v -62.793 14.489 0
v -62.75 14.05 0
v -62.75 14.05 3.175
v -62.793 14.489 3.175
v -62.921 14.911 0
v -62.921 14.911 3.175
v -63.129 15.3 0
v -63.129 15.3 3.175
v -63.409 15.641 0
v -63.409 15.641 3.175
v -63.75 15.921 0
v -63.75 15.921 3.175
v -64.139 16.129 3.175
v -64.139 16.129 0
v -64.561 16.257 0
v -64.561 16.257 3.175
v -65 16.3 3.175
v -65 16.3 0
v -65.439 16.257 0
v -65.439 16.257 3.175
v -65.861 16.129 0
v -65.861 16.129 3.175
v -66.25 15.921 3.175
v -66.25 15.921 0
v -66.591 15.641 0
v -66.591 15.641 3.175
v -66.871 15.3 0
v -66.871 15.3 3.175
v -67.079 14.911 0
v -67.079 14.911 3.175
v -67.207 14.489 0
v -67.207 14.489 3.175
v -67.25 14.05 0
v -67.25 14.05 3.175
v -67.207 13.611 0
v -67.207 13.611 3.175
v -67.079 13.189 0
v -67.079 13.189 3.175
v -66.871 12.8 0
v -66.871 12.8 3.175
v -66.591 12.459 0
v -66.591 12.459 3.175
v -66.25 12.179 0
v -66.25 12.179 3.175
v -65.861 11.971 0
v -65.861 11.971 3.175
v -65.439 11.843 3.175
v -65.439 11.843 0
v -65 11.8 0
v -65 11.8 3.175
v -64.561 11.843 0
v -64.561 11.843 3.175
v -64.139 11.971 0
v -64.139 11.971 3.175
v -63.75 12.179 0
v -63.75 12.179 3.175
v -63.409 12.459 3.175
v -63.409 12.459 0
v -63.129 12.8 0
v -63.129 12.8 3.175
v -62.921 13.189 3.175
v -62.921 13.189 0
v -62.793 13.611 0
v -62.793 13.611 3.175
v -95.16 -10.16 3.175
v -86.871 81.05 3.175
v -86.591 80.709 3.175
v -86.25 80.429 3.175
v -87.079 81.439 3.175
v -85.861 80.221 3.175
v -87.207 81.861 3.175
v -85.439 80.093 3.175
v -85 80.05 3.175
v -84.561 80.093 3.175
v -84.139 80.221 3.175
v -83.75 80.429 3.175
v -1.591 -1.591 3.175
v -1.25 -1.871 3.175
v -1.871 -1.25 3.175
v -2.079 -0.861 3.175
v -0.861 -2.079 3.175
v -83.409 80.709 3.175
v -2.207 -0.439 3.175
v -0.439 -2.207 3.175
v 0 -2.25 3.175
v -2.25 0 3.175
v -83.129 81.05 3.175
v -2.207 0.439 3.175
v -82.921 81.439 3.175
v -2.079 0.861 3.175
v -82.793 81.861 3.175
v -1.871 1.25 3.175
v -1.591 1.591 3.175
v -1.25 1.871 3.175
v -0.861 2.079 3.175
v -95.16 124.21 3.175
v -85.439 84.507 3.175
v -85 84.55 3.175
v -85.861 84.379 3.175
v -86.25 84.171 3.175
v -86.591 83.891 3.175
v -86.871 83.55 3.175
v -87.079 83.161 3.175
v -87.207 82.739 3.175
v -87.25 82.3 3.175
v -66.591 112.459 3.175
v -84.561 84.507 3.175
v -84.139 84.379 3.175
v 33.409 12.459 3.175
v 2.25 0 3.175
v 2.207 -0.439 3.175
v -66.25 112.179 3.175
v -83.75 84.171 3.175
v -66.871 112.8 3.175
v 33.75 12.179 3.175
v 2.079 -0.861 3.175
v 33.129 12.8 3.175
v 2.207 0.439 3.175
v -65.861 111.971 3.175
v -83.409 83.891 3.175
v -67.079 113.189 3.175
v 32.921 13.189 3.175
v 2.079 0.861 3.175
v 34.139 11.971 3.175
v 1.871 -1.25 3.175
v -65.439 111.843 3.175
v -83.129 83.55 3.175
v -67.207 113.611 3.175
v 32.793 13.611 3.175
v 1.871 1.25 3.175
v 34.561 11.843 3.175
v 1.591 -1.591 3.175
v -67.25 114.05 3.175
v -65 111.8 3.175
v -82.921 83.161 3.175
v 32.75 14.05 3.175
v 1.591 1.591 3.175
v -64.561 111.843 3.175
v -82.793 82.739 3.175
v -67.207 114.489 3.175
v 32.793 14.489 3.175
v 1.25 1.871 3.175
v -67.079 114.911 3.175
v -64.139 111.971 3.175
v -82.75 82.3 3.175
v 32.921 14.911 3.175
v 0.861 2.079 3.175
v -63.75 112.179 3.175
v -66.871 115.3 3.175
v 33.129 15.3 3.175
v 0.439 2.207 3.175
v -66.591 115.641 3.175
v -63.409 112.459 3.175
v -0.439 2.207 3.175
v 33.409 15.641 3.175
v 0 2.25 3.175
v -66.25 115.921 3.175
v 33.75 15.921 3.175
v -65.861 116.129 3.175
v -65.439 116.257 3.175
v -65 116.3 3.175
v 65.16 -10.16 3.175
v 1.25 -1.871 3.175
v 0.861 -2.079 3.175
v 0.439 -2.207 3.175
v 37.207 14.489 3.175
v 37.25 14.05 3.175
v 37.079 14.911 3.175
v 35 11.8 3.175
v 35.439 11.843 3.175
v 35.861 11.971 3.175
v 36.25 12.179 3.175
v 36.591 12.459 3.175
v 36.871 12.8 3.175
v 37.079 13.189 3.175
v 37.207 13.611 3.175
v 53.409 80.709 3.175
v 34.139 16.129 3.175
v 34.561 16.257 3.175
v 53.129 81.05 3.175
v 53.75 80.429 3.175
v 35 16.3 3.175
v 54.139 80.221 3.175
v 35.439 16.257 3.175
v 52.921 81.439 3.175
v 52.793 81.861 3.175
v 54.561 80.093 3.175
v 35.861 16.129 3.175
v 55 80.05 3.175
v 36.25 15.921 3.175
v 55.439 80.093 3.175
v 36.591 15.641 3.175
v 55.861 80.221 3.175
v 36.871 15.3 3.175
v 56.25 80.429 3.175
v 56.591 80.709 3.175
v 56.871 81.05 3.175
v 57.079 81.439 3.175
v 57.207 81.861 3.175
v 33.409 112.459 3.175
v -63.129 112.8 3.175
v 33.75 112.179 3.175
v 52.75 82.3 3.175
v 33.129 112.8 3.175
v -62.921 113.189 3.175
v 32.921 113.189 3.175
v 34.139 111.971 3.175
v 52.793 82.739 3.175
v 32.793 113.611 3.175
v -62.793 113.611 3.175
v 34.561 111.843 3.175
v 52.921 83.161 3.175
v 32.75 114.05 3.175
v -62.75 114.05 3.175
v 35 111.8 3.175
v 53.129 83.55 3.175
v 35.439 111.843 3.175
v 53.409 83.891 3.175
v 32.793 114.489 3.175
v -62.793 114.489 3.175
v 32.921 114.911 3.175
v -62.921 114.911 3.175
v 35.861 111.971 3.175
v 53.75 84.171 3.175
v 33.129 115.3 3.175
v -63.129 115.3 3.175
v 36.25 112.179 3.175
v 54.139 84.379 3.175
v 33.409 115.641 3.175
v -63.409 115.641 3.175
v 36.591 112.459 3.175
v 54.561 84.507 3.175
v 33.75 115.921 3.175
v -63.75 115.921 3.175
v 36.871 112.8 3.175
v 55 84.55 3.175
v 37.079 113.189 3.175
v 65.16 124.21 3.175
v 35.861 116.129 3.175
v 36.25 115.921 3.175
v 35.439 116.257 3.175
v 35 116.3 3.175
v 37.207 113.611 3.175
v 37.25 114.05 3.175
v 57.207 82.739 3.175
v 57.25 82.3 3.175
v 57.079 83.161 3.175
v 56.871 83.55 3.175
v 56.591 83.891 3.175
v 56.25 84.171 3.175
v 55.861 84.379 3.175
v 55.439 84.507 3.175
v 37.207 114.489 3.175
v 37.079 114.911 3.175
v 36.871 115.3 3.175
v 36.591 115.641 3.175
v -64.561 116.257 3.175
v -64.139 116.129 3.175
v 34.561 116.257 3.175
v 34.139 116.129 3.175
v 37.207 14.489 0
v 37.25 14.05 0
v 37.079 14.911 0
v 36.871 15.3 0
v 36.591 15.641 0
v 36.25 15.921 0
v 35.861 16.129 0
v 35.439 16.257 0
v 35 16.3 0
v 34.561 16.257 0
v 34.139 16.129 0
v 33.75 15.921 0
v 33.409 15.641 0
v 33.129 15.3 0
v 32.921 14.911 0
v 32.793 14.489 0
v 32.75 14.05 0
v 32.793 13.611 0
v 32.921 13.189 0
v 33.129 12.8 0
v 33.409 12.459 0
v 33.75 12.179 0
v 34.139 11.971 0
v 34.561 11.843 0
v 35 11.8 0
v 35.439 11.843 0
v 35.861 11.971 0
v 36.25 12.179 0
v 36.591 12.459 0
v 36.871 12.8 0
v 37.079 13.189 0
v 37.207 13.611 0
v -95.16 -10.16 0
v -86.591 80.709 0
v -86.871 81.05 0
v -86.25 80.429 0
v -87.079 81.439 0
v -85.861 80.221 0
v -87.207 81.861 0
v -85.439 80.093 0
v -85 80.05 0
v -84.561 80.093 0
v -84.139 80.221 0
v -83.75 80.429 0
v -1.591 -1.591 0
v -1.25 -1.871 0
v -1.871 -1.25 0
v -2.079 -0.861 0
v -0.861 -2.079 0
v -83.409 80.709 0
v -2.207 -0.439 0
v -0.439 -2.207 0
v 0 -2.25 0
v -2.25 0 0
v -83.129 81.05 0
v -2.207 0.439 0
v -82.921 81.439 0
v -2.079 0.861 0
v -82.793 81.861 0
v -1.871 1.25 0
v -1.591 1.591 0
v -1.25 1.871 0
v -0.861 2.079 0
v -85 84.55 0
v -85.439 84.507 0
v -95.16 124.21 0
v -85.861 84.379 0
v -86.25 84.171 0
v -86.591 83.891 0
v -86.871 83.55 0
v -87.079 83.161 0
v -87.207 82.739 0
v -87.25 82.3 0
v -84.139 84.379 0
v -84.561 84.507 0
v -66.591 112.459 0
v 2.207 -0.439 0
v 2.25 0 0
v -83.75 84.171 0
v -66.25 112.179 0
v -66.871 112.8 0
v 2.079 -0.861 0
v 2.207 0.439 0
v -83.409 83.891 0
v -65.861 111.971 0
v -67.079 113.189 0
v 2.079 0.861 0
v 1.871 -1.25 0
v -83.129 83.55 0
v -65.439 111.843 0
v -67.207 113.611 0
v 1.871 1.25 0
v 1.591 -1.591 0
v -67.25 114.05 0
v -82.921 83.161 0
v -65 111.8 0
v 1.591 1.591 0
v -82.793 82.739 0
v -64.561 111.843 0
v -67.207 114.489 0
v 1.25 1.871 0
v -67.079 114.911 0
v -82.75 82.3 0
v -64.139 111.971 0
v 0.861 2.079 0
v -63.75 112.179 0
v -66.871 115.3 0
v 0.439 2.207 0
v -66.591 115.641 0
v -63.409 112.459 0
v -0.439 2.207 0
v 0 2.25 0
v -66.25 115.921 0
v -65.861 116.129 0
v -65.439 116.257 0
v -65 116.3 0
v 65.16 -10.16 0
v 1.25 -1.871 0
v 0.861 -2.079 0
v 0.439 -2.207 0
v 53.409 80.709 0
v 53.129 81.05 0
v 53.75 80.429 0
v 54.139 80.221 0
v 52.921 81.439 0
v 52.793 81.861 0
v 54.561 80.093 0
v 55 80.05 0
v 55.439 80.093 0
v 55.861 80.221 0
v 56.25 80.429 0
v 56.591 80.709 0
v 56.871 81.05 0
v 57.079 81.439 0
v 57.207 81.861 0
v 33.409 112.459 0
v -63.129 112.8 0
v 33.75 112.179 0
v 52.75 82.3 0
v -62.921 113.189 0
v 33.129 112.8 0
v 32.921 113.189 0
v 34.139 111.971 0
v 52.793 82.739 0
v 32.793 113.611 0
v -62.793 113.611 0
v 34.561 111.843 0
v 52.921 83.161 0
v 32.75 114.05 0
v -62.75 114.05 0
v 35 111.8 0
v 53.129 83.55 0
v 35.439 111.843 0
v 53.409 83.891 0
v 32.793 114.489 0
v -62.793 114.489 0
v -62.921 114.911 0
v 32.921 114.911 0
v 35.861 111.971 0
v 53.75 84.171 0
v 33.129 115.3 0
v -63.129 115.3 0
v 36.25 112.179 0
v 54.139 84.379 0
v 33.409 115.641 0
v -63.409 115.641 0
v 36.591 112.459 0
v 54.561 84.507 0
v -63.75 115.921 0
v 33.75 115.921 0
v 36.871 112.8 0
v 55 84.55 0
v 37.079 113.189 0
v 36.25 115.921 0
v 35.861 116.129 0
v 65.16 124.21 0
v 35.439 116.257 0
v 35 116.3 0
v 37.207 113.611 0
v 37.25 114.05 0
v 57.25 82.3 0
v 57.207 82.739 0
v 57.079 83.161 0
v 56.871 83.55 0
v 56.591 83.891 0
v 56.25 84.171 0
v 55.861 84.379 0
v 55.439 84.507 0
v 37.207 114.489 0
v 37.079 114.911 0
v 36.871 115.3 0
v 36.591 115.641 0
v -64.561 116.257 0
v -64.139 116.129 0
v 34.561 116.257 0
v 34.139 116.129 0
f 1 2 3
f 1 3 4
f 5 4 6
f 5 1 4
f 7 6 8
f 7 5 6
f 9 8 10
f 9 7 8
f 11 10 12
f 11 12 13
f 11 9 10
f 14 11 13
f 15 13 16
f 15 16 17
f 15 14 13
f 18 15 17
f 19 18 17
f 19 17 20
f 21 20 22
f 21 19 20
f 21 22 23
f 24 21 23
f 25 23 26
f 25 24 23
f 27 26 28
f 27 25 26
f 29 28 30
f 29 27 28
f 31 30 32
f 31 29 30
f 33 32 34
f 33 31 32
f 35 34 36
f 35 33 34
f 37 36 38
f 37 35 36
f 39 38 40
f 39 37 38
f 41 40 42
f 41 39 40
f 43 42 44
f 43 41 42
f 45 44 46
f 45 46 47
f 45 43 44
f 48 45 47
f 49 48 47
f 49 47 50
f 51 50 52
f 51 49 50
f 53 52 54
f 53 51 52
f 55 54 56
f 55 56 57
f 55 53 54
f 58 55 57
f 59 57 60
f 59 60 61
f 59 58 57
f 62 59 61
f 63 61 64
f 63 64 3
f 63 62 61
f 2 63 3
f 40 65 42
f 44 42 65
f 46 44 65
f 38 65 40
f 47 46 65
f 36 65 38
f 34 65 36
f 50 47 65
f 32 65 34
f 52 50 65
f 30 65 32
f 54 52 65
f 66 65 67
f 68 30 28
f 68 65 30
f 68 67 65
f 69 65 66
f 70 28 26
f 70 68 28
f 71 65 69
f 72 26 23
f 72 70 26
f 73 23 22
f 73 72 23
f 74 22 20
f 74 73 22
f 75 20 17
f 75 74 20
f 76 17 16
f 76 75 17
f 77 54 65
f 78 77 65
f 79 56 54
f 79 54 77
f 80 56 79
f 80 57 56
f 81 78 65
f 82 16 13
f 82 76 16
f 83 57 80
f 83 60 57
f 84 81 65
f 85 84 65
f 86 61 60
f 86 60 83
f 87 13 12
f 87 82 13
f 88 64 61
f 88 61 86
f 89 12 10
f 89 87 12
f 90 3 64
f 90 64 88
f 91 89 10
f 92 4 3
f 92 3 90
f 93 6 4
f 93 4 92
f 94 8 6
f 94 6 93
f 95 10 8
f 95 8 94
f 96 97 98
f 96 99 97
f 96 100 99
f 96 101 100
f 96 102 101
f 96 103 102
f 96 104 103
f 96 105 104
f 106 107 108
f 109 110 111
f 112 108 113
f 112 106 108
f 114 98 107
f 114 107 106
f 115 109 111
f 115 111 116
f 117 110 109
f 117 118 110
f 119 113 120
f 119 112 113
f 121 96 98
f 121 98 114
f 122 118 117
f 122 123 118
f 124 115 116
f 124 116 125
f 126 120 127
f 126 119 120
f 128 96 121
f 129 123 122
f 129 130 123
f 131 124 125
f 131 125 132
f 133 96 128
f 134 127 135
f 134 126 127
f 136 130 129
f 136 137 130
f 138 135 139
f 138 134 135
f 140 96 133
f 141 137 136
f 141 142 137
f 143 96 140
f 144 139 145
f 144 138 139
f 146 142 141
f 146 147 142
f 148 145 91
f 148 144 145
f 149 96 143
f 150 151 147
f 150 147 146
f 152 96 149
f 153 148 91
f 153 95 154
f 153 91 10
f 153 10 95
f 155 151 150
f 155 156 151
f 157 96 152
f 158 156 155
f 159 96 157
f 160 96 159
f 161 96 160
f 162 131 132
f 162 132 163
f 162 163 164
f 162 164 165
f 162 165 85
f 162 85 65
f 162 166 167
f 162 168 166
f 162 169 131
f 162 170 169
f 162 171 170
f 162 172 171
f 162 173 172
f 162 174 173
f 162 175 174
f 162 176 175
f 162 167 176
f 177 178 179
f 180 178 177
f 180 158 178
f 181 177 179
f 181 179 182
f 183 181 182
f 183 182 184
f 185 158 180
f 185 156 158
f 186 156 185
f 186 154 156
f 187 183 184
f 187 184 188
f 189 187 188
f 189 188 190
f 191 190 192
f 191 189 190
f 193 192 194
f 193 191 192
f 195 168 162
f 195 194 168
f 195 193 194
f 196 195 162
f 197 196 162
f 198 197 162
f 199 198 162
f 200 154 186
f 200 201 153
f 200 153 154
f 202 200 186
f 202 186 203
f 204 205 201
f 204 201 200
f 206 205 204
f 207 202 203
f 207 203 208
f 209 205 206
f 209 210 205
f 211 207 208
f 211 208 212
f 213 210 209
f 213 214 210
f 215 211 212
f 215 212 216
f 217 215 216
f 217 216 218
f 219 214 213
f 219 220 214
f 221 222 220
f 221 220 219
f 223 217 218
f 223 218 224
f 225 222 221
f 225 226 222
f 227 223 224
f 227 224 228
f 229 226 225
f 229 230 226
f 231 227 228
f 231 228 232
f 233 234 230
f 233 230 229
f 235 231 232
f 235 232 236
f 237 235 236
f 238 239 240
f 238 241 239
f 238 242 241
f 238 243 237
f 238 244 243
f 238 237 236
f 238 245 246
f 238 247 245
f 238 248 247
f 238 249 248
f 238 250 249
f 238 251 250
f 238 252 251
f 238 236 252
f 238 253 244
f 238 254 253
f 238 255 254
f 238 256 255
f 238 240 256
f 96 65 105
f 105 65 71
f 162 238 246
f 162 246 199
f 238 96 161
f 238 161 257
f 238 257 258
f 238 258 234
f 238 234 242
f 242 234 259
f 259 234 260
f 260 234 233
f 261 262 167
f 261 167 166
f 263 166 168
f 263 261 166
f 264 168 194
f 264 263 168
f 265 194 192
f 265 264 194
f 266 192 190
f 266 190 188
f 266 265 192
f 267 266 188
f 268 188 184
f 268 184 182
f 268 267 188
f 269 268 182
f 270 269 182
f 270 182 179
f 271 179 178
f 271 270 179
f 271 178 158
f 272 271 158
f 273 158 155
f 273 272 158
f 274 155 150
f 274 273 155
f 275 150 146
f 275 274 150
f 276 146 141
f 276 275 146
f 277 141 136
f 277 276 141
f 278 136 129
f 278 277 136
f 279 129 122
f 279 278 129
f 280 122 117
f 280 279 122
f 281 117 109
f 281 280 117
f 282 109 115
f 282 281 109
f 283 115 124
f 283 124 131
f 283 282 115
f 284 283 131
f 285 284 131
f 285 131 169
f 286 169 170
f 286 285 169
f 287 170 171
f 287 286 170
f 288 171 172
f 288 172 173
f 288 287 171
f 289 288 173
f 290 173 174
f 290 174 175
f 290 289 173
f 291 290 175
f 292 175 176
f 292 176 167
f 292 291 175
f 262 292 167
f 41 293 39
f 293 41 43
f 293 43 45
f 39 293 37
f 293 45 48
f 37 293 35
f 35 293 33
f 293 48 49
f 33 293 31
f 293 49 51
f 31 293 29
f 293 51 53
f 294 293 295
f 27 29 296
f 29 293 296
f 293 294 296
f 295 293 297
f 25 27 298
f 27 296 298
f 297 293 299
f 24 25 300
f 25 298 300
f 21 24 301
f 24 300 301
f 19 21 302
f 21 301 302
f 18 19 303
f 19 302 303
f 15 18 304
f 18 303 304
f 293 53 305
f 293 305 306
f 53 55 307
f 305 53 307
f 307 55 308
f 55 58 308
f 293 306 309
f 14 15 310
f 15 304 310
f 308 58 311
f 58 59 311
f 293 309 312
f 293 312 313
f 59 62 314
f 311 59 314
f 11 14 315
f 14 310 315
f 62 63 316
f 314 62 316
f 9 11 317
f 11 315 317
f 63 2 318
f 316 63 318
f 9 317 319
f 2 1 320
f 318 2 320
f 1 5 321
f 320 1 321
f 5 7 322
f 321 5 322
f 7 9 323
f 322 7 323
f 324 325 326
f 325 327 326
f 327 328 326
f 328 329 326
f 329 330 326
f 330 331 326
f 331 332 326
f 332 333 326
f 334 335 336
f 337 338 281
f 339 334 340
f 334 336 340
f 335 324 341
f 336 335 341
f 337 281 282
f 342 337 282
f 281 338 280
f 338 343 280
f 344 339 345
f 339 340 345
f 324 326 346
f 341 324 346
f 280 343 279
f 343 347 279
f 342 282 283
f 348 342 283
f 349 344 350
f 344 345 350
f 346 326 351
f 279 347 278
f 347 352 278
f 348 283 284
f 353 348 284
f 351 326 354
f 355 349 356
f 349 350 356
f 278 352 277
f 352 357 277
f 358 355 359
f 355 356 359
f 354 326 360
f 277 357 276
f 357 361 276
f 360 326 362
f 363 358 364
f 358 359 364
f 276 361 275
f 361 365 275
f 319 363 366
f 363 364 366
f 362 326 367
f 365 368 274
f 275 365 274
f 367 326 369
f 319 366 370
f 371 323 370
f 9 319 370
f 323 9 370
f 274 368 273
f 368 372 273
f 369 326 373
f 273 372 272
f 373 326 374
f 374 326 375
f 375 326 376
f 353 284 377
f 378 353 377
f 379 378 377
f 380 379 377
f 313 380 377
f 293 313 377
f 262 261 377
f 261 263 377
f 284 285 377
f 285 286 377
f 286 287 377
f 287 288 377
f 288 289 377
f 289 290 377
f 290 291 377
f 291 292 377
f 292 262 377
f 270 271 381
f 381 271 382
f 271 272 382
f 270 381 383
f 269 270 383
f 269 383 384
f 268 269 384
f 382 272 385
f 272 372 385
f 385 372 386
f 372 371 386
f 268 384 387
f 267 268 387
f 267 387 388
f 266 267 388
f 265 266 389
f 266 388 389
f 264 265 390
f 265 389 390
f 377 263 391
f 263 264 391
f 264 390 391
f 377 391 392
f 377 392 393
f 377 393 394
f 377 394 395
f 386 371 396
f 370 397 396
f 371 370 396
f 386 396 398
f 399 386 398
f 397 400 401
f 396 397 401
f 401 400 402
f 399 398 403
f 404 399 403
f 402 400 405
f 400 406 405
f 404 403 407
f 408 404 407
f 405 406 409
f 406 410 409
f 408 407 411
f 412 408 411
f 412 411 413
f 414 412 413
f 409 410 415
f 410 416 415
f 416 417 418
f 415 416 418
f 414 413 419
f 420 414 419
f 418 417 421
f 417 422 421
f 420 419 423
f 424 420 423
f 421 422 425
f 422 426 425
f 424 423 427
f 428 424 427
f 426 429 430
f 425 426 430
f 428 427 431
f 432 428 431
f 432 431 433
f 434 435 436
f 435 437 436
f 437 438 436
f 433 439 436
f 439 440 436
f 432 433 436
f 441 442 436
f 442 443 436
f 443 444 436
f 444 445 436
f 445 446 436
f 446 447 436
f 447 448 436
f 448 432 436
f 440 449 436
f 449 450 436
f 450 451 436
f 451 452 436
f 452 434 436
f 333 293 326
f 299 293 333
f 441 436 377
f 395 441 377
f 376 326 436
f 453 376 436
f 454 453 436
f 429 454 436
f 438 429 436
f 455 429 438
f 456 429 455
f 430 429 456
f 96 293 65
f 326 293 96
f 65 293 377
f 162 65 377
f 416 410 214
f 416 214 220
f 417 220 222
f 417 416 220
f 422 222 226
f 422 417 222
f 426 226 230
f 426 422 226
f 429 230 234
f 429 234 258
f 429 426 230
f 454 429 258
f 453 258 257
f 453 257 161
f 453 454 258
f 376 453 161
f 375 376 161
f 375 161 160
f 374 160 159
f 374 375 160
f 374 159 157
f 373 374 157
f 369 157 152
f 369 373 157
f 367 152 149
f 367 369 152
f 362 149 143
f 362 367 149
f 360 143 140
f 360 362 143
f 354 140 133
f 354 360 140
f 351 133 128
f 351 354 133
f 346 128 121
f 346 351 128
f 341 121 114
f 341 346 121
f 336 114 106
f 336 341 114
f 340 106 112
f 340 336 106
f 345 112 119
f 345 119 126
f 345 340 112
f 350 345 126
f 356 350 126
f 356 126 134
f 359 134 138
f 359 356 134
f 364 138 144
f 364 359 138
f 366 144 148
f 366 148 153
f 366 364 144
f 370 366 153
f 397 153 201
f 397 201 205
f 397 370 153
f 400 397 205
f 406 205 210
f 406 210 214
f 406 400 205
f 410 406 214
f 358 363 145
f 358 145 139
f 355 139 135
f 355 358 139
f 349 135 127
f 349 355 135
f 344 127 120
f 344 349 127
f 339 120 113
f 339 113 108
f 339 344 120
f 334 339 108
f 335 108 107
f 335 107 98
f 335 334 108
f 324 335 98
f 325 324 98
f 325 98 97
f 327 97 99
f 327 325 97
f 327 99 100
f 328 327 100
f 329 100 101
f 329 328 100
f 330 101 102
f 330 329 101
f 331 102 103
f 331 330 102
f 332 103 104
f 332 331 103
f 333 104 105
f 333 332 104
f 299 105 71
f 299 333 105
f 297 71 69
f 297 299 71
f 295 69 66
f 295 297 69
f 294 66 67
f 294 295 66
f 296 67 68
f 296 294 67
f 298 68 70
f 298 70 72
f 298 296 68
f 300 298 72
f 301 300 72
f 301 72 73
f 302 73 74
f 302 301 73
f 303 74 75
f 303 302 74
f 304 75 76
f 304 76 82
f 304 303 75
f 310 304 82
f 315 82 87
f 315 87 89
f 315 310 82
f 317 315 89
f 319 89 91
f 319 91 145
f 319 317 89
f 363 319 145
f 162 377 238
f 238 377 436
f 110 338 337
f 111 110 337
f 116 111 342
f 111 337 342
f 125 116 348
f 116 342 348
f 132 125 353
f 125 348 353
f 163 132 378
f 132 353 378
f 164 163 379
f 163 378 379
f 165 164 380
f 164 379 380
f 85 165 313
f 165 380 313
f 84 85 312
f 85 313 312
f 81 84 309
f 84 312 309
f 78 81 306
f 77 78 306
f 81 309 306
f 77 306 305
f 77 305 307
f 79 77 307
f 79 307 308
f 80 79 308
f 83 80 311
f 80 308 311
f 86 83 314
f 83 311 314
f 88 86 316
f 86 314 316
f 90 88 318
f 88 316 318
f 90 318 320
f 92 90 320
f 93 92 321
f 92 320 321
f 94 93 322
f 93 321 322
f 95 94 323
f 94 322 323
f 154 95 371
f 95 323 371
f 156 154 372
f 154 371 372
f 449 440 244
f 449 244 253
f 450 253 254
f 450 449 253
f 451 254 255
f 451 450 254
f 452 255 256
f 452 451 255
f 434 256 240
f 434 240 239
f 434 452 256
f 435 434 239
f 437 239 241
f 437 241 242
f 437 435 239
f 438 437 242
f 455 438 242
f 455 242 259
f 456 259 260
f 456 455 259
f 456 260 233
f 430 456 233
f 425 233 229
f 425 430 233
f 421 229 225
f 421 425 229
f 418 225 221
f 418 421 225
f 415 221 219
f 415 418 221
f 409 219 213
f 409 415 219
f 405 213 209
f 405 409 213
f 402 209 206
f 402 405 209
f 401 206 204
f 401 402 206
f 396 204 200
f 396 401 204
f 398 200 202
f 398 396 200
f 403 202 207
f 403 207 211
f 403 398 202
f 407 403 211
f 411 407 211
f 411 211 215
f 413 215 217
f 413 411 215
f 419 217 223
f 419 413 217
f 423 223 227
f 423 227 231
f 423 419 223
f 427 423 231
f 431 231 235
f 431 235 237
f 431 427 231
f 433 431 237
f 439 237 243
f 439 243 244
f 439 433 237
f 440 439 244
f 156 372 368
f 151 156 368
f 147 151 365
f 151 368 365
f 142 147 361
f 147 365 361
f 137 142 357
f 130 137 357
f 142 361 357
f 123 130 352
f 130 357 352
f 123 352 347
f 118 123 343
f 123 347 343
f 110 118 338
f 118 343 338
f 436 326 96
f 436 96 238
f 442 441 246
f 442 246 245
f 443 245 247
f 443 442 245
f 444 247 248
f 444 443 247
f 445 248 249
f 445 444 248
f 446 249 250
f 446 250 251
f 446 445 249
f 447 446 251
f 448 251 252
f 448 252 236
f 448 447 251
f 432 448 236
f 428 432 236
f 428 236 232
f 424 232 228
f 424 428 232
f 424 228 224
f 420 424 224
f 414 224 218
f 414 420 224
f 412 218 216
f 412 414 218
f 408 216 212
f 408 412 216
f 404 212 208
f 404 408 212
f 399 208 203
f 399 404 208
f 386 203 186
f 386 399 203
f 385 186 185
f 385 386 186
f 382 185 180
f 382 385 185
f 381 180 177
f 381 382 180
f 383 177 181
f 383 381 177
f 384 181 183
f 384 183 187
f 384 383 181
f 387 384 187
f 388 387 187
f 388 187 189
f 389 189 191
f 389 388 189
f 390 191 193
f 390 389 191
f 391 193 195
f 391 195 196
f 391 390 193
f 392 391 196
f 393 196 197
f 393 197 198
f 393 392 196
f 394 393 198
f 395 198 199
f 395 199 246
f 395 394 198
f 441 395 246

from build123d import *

# Parameters (mm, degrees)
F0_W     = 160.32
F0_H     = 134.37
F0_R     = 2.25
F1_DEPTH = 3.175


# Not quite as in the source:
# - a length typed as a fraction of an inch, garbled in the dataset ("3 / 203.2 mm" for 3/8 in), is restored


with BuildPart() as f1:
    # F0 (on Top) → F1 (new body)
    with BuildSketch(Plane.XY):
        with Locations((-15, 57.025)):
            Rectangle(F0_W, F0_H)
        with Locations((-65, 14.05)):
            Circle(F0_R, mode=Mode.SUBTRACT)
        with BuildLine():
            ThreePointArc((0, 2.25), (1.5909902577, 1.5909902577), (2.25, 0))
            ThreePointArc((2.25, 0), (-1.5909902577, -1.5909902577), (0, 2.25))
        make_face(mode=Mode.SUBTRACT)
        with Locations((35, 14.05)):
            Circle(F0_R, mode=Mode.SUBTRACT)
        with Locations((-85, 82.3)):
            Circle(F0_R, mode=Mode.SUBTRACT)
        with Locations((-65, 114.05)):
            Circle(F0_R, mode=Mode.SUBTRACT)
        with Locations((55, 82.3)):
            Circle(F0_R, mode=Mode.SUBTRACT)
        with Locations((35, 114.05)):
            Circle(F0_R, mode=Mode.SUBTRACT)
    extrude(amount=F1_DEPTH)


solid = f1.part
